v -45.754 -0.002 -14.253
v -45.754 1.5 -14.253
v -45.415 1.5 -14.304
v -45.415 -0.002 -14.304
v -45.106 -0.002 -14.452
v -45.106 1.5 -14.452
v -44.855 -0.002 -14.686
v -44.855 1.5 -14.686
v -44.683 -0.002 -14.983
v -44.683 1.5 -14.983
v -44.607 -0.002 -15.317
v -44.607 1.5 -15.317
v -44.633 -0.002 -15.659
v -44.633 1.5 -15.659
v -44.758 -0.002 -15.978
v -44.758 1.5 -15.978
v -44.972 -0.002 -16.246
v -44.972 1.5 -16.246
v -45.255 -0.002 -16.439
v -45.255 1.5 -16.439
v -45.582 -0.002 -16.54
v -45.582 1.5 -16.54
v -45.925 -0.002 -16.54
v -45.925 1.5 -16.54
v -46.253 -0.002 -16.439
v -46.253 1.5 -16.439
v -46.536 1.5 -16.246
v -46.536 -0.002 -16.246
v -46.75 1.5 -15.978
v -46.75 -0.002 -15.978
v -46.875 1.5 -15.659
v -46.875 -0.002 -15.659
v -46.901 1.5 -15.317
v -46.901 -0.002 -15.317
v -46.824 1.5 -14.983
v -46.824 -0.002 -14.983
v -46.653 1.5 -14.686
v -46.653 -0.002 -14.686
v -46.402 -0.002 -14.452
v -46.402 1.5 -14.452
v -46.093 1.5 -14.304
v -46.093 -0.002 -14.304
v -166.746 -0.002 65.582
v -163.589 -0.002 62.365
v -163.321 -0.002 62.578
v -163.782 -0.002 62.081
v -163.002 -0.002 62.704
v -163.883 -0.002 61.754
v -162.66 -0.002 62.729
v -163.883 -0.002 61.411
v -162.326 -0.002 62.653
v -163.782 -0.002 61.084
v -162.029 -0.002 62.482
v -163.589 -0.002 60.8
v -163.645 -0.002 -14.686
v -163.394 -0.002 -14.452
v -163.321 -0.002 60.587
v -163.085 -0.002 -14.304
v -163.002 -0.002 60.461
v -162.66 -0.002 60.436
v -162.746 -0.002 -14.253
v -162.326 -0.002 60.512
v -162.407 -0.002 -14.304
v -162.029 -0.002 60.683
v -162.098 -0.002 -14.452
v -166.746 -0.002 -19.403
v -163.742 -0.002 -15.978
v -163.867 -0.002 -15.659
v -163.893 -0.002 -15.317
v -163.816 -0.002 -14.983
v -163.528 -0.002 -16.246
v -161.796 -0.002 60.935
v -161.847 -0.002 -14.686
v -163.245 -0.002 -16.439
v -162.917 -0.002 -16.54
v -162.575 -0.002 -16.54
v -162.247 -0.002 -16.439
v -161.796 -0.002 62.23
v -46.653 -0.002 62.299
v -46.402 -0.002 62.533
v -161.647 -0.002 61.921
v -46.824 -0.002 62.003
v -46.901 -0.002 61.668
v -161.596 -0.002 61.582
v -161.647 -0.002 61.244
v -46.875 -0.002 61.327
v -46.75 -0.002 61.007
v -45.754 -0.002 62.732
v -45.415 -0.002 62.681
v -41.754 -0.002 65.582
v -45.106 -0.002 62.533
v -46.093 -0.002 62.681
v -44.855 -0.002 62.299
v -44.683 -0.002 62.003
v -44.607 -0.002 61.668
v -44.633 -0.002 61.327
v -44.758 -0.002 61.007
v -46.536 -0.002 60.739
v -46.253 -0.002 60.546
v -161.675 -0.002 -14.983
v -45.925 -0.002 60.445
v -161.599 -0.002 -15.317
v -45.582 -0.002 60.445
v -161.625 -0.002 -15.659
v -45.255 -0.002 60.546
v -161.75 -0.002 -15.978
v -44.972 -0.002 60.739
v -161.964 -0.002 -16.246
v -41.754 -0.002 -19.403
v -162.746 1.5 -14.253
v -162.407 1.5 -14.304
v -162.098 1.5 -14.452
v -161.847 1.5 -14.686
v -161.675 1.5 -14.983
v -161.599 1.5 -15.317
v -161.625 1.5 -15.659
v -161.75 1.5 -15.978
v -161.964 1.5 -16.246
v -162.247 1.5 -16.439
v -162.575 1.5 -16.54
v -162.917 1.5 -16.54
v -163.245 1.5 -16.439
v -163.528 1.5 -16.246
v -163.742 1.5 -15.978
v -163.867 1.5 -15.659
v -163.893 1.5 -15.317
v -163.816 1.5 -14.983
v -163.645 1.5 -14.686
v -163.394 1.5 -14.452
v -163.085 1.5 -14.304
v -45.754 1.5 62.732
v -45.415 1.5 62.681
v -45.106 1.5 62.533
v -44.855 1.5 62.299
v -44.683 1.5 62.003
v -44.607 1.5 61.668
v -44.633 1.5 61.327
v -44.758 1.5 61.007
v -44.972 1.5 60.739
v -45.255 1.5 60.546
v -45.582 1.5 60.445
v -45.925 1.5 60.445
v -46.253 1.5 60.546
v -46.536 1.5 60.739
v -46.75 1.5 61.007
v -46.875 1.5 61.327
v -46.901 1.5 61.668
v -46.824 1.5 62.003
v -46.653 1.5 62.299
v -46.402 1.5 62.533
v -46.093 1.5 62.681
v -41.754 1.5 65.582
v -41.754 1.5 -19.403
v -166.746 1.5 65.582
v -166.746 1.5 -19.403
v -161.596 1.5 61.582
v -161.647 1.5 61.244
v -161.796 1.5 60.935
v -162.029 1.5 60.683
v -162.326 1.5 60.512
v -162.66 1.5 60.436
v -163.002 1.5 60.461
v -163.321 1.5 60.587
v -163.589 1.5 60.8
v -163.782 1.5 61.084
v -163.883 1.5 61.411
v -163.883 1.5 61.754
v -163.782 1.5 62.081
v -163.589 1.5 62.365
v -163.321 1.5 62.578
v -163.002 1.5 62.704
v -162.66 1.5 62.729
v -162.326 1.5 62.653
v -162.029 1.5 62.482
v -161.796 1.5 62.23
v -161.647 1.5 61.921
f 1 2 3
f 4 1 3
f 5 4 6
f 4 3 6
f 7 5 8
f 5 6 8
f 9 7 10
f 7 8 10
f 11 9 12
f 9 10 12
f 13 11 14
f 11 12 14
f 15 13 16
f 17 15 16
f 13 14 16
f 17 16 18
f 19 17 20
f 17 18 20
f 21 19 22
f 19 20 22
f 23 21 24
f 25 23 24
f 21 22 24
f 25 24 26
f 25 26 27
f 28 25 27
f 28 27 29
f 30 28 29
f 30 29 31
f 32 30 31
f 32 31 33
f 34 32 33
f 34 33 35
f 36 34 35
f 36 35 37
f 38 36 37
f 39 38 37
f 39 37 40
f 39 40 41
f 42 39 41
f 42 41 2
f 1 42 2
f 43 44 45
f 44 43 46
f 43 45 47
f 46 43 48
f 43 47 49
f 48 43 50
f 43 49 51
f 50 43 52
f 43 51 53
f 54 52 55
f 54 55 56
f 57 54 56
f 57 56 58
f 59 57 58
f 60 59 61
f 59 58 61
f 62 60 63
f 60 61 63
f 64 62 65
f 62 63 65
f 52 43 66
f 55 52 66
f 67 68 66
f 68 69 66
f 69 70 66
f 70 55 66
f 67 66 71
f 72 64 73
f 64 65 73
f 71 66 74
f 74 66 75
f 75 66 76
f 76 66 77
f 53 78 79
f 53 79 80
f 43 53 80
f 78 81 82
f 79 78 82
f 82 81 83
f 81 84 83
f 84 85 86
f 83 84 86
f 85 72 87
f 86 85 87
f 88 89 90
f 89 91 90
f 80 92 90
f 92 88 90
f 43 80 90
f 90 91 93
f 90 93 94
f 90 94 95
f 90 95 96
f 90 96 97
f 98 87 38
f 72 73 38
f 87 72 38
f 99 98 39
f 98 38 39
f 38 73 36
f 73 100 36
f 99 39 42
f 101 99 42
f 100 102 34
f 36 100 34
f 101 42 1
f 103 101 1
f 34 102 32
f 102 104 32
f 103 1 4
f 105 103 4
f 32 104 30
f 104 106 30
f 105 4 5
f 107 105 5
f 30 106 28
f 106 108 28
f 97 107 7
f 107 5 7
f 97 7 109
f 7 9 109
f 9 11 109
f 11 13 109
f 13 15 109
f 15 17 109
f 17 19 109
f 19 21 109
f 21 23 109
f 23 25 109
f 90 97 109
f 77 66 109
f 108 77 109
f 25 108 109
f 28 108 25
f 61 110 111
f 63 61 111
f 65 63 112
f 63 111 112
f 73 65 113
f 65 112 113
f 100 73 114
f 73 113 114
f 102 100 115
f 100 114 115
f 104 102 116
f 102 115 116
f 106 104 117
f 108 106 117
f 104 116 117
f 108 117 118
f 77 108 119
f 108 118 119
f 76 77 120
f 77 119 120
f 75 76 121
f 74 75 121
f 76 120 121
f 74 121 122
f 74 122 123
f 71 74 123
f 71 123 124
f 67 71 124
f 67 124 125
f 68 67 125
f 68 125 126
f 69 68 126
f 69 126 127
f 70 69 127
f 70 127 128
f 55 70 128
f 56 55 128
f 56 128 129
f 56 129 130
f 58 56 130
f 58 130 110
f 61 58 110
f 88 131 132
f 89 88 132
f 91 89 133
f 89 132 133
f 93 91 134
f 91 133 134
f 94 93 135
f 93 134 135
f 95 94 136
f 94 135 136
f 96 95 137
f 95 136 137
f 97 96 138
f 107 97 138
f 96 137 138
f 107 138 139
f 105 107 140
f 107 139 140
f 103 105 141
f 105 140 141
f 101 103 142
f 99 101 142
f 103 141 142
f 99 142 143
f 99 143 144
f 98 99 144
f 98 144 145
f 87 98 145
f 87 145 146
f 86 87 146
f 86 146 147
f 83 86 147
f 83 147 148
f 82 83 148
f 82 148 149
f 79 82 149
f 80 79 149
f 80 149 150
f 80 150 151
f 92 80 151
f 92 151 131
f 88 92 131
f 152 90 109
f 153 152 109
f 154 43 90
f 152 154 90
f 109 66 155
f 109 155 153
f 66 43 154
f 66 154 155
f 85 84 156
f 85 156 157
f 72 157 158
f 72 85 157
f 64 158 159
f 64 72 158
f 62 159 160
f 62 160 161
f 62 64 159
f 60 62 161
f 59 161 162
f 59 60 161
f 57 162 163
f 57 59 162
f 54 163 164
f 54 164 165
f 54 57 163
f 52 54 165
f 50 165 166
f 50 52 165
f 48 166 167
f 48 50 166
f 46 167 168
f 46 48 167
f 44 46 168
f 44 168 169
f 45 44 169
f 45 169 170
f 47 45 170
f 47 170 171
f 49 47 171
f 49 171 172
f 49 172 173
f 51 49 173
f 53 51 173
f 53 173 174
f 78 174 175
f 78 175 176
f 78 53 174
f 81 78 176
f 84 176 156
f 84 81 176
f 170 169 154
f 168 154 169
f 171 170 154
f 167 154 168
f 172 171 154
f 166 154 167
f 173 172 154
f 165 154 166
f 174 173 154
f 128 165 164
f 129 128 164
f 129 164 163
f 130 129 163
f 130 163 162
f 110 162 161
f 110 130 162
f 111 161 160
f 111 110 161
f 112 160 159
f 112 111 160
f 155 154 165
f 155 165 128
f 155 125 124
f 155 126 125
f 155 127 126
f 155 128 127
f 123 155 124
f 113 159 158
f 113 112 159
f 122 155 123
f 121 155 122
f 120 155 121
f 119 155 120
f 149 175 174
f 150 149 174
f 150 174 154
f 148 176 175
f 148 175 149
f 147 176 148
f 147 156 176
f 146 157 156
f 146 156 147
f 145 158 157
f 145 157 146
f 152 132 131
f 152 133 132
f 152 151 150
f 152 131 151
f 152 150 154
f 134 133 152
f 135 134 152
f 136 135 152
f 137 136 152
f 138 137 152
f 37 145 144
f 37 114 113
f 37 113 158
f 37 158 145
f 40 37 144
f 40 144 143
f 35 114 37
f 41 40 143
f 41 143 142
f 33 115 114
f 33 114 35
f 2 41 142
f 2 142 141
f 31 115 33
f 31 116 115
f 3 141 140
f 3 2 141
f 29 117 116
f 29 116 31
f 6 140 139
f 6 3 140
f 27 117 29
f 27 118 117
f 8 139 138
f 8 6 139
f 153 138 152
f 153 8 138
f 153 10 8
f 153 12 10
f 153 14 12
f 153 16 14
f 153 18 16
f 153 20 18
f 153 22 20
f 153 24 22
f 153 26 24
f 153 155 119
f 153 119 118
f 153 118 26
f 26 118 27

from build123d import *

# Parameters (mm, degrees)
BOSS_EXTRU_1_DEPTH      = 1.5
BOSS_EXTRU_1_DEPTH_BACK = 0.0018
ESQUISSE1_W             = 124.992092973
ESQUISSE1_H             = 84.985144333
BOSS_EXTRU_5_START      = -1.5018
BOSS_EXTRU_5_OUTLINE_R  = 1.15
BOSS_EXTRU_5_DEPTH      = 1.5018
ESQUISSE5_R             = 1.15
ENL_V_MAT_EXTRU_1_DEPTH = 13
ESQUISSE6_R             = 1.15
ENL_V_MAT_EXTRU_2_DEPTH = 1.577439541
ESQUISSE7_R             = 1.15
ENL_V_MAT_EXTRU_3_DEPTH = 1.51


# Read off the part's stored shape, not the designer's step: Boss.-Extru.5
with BuildPart() as part:
    # Esquisse1 → Boss.-Extru.1 (new, two sides: drawn at the far end of the back side and taken through both)
    with BuildSketch(Plane(origin=(0, 0, 0), x_dir=(1, 0, 0), z_dir=(0, 1, 0)).offset(-BOSS_EXTRU_1_DEPTH_BACK)):
        with Locations((-104.249914402, -23.089910991)):
            Rectangle(ESQUISSE1_W, ESQUISSE1_H)
    extrude(amount=BOSS_EXTRU_1_DEPTH + BOSS_EXTRU_1_DEPTH_BACK)

    # Boss.-Extru.5 outline → Boss.-Extru.5 (cut)
    with BuildSketch(Plane(origin=(0, 1.5, 0), x_dir=(1, 0, 0), z_dir=(0, 1, 0)).offset(BOSS_EXTRU_5_START)):
        with Locations((-162.745960889, -61.582483158)):
            Circle(BOSS_EXTRU_5_OUTLINE_R)
    extrude(amount=BOSS_EXTRU_5_DEPTH, mode=Mode.SUBTRACT)

    # Esquisse5 → Enlèv. mat.-Extru.1 (cut)
    with BuildSketch(Plane(origin=(0, 1.5, 0), x_dir=(1, 0, 0), z_dir=(0, 1, 0))):
        with Locations(Location((-162.745960889, 15.402661175, 0), (0, 0, 270))):
            Circle(ESQUISSE5_R)
    extrude(amount=-ENL_V_MAT_EXTRU_1_DEPTH, mode=Mode.SUBTRACT)

    # Esquisse6 → Enlèv. mat.-Extru.2 (cut)
    with BuildSketch(Plane(origin=(0, 1.5, 0), x_dir=(1, 0, 0), z_dir=(0, 1, 0))):
        with Locations(Location((-45.753867916, 15.402661175, 0), (0, 0, 270))):
            Circle(ESQUISSE6_R)
    extrude(amount=-ENL_V_MAT_EXTRU_2_DEPTH, mode=Mode.SUBTRACT)

    # Esquisse7 → Enlèv. mat.-Extru.3 (cut)
    with BuildSketch(Plane(origin=(0, 1.5, 0), x_dir=(1, 0, 0), z_dir=(0, 1, 0))):
        with Locations(Location((-45.753867916, -61.582483158, 0), (0, 0, 270))):
            Circle(ESQUISSE7_R)
    extrude(amount=-ENL_V_MAT_EXTRU_3_DEPTH, mode=Mode.SUBTRACT)


solid = part.part
